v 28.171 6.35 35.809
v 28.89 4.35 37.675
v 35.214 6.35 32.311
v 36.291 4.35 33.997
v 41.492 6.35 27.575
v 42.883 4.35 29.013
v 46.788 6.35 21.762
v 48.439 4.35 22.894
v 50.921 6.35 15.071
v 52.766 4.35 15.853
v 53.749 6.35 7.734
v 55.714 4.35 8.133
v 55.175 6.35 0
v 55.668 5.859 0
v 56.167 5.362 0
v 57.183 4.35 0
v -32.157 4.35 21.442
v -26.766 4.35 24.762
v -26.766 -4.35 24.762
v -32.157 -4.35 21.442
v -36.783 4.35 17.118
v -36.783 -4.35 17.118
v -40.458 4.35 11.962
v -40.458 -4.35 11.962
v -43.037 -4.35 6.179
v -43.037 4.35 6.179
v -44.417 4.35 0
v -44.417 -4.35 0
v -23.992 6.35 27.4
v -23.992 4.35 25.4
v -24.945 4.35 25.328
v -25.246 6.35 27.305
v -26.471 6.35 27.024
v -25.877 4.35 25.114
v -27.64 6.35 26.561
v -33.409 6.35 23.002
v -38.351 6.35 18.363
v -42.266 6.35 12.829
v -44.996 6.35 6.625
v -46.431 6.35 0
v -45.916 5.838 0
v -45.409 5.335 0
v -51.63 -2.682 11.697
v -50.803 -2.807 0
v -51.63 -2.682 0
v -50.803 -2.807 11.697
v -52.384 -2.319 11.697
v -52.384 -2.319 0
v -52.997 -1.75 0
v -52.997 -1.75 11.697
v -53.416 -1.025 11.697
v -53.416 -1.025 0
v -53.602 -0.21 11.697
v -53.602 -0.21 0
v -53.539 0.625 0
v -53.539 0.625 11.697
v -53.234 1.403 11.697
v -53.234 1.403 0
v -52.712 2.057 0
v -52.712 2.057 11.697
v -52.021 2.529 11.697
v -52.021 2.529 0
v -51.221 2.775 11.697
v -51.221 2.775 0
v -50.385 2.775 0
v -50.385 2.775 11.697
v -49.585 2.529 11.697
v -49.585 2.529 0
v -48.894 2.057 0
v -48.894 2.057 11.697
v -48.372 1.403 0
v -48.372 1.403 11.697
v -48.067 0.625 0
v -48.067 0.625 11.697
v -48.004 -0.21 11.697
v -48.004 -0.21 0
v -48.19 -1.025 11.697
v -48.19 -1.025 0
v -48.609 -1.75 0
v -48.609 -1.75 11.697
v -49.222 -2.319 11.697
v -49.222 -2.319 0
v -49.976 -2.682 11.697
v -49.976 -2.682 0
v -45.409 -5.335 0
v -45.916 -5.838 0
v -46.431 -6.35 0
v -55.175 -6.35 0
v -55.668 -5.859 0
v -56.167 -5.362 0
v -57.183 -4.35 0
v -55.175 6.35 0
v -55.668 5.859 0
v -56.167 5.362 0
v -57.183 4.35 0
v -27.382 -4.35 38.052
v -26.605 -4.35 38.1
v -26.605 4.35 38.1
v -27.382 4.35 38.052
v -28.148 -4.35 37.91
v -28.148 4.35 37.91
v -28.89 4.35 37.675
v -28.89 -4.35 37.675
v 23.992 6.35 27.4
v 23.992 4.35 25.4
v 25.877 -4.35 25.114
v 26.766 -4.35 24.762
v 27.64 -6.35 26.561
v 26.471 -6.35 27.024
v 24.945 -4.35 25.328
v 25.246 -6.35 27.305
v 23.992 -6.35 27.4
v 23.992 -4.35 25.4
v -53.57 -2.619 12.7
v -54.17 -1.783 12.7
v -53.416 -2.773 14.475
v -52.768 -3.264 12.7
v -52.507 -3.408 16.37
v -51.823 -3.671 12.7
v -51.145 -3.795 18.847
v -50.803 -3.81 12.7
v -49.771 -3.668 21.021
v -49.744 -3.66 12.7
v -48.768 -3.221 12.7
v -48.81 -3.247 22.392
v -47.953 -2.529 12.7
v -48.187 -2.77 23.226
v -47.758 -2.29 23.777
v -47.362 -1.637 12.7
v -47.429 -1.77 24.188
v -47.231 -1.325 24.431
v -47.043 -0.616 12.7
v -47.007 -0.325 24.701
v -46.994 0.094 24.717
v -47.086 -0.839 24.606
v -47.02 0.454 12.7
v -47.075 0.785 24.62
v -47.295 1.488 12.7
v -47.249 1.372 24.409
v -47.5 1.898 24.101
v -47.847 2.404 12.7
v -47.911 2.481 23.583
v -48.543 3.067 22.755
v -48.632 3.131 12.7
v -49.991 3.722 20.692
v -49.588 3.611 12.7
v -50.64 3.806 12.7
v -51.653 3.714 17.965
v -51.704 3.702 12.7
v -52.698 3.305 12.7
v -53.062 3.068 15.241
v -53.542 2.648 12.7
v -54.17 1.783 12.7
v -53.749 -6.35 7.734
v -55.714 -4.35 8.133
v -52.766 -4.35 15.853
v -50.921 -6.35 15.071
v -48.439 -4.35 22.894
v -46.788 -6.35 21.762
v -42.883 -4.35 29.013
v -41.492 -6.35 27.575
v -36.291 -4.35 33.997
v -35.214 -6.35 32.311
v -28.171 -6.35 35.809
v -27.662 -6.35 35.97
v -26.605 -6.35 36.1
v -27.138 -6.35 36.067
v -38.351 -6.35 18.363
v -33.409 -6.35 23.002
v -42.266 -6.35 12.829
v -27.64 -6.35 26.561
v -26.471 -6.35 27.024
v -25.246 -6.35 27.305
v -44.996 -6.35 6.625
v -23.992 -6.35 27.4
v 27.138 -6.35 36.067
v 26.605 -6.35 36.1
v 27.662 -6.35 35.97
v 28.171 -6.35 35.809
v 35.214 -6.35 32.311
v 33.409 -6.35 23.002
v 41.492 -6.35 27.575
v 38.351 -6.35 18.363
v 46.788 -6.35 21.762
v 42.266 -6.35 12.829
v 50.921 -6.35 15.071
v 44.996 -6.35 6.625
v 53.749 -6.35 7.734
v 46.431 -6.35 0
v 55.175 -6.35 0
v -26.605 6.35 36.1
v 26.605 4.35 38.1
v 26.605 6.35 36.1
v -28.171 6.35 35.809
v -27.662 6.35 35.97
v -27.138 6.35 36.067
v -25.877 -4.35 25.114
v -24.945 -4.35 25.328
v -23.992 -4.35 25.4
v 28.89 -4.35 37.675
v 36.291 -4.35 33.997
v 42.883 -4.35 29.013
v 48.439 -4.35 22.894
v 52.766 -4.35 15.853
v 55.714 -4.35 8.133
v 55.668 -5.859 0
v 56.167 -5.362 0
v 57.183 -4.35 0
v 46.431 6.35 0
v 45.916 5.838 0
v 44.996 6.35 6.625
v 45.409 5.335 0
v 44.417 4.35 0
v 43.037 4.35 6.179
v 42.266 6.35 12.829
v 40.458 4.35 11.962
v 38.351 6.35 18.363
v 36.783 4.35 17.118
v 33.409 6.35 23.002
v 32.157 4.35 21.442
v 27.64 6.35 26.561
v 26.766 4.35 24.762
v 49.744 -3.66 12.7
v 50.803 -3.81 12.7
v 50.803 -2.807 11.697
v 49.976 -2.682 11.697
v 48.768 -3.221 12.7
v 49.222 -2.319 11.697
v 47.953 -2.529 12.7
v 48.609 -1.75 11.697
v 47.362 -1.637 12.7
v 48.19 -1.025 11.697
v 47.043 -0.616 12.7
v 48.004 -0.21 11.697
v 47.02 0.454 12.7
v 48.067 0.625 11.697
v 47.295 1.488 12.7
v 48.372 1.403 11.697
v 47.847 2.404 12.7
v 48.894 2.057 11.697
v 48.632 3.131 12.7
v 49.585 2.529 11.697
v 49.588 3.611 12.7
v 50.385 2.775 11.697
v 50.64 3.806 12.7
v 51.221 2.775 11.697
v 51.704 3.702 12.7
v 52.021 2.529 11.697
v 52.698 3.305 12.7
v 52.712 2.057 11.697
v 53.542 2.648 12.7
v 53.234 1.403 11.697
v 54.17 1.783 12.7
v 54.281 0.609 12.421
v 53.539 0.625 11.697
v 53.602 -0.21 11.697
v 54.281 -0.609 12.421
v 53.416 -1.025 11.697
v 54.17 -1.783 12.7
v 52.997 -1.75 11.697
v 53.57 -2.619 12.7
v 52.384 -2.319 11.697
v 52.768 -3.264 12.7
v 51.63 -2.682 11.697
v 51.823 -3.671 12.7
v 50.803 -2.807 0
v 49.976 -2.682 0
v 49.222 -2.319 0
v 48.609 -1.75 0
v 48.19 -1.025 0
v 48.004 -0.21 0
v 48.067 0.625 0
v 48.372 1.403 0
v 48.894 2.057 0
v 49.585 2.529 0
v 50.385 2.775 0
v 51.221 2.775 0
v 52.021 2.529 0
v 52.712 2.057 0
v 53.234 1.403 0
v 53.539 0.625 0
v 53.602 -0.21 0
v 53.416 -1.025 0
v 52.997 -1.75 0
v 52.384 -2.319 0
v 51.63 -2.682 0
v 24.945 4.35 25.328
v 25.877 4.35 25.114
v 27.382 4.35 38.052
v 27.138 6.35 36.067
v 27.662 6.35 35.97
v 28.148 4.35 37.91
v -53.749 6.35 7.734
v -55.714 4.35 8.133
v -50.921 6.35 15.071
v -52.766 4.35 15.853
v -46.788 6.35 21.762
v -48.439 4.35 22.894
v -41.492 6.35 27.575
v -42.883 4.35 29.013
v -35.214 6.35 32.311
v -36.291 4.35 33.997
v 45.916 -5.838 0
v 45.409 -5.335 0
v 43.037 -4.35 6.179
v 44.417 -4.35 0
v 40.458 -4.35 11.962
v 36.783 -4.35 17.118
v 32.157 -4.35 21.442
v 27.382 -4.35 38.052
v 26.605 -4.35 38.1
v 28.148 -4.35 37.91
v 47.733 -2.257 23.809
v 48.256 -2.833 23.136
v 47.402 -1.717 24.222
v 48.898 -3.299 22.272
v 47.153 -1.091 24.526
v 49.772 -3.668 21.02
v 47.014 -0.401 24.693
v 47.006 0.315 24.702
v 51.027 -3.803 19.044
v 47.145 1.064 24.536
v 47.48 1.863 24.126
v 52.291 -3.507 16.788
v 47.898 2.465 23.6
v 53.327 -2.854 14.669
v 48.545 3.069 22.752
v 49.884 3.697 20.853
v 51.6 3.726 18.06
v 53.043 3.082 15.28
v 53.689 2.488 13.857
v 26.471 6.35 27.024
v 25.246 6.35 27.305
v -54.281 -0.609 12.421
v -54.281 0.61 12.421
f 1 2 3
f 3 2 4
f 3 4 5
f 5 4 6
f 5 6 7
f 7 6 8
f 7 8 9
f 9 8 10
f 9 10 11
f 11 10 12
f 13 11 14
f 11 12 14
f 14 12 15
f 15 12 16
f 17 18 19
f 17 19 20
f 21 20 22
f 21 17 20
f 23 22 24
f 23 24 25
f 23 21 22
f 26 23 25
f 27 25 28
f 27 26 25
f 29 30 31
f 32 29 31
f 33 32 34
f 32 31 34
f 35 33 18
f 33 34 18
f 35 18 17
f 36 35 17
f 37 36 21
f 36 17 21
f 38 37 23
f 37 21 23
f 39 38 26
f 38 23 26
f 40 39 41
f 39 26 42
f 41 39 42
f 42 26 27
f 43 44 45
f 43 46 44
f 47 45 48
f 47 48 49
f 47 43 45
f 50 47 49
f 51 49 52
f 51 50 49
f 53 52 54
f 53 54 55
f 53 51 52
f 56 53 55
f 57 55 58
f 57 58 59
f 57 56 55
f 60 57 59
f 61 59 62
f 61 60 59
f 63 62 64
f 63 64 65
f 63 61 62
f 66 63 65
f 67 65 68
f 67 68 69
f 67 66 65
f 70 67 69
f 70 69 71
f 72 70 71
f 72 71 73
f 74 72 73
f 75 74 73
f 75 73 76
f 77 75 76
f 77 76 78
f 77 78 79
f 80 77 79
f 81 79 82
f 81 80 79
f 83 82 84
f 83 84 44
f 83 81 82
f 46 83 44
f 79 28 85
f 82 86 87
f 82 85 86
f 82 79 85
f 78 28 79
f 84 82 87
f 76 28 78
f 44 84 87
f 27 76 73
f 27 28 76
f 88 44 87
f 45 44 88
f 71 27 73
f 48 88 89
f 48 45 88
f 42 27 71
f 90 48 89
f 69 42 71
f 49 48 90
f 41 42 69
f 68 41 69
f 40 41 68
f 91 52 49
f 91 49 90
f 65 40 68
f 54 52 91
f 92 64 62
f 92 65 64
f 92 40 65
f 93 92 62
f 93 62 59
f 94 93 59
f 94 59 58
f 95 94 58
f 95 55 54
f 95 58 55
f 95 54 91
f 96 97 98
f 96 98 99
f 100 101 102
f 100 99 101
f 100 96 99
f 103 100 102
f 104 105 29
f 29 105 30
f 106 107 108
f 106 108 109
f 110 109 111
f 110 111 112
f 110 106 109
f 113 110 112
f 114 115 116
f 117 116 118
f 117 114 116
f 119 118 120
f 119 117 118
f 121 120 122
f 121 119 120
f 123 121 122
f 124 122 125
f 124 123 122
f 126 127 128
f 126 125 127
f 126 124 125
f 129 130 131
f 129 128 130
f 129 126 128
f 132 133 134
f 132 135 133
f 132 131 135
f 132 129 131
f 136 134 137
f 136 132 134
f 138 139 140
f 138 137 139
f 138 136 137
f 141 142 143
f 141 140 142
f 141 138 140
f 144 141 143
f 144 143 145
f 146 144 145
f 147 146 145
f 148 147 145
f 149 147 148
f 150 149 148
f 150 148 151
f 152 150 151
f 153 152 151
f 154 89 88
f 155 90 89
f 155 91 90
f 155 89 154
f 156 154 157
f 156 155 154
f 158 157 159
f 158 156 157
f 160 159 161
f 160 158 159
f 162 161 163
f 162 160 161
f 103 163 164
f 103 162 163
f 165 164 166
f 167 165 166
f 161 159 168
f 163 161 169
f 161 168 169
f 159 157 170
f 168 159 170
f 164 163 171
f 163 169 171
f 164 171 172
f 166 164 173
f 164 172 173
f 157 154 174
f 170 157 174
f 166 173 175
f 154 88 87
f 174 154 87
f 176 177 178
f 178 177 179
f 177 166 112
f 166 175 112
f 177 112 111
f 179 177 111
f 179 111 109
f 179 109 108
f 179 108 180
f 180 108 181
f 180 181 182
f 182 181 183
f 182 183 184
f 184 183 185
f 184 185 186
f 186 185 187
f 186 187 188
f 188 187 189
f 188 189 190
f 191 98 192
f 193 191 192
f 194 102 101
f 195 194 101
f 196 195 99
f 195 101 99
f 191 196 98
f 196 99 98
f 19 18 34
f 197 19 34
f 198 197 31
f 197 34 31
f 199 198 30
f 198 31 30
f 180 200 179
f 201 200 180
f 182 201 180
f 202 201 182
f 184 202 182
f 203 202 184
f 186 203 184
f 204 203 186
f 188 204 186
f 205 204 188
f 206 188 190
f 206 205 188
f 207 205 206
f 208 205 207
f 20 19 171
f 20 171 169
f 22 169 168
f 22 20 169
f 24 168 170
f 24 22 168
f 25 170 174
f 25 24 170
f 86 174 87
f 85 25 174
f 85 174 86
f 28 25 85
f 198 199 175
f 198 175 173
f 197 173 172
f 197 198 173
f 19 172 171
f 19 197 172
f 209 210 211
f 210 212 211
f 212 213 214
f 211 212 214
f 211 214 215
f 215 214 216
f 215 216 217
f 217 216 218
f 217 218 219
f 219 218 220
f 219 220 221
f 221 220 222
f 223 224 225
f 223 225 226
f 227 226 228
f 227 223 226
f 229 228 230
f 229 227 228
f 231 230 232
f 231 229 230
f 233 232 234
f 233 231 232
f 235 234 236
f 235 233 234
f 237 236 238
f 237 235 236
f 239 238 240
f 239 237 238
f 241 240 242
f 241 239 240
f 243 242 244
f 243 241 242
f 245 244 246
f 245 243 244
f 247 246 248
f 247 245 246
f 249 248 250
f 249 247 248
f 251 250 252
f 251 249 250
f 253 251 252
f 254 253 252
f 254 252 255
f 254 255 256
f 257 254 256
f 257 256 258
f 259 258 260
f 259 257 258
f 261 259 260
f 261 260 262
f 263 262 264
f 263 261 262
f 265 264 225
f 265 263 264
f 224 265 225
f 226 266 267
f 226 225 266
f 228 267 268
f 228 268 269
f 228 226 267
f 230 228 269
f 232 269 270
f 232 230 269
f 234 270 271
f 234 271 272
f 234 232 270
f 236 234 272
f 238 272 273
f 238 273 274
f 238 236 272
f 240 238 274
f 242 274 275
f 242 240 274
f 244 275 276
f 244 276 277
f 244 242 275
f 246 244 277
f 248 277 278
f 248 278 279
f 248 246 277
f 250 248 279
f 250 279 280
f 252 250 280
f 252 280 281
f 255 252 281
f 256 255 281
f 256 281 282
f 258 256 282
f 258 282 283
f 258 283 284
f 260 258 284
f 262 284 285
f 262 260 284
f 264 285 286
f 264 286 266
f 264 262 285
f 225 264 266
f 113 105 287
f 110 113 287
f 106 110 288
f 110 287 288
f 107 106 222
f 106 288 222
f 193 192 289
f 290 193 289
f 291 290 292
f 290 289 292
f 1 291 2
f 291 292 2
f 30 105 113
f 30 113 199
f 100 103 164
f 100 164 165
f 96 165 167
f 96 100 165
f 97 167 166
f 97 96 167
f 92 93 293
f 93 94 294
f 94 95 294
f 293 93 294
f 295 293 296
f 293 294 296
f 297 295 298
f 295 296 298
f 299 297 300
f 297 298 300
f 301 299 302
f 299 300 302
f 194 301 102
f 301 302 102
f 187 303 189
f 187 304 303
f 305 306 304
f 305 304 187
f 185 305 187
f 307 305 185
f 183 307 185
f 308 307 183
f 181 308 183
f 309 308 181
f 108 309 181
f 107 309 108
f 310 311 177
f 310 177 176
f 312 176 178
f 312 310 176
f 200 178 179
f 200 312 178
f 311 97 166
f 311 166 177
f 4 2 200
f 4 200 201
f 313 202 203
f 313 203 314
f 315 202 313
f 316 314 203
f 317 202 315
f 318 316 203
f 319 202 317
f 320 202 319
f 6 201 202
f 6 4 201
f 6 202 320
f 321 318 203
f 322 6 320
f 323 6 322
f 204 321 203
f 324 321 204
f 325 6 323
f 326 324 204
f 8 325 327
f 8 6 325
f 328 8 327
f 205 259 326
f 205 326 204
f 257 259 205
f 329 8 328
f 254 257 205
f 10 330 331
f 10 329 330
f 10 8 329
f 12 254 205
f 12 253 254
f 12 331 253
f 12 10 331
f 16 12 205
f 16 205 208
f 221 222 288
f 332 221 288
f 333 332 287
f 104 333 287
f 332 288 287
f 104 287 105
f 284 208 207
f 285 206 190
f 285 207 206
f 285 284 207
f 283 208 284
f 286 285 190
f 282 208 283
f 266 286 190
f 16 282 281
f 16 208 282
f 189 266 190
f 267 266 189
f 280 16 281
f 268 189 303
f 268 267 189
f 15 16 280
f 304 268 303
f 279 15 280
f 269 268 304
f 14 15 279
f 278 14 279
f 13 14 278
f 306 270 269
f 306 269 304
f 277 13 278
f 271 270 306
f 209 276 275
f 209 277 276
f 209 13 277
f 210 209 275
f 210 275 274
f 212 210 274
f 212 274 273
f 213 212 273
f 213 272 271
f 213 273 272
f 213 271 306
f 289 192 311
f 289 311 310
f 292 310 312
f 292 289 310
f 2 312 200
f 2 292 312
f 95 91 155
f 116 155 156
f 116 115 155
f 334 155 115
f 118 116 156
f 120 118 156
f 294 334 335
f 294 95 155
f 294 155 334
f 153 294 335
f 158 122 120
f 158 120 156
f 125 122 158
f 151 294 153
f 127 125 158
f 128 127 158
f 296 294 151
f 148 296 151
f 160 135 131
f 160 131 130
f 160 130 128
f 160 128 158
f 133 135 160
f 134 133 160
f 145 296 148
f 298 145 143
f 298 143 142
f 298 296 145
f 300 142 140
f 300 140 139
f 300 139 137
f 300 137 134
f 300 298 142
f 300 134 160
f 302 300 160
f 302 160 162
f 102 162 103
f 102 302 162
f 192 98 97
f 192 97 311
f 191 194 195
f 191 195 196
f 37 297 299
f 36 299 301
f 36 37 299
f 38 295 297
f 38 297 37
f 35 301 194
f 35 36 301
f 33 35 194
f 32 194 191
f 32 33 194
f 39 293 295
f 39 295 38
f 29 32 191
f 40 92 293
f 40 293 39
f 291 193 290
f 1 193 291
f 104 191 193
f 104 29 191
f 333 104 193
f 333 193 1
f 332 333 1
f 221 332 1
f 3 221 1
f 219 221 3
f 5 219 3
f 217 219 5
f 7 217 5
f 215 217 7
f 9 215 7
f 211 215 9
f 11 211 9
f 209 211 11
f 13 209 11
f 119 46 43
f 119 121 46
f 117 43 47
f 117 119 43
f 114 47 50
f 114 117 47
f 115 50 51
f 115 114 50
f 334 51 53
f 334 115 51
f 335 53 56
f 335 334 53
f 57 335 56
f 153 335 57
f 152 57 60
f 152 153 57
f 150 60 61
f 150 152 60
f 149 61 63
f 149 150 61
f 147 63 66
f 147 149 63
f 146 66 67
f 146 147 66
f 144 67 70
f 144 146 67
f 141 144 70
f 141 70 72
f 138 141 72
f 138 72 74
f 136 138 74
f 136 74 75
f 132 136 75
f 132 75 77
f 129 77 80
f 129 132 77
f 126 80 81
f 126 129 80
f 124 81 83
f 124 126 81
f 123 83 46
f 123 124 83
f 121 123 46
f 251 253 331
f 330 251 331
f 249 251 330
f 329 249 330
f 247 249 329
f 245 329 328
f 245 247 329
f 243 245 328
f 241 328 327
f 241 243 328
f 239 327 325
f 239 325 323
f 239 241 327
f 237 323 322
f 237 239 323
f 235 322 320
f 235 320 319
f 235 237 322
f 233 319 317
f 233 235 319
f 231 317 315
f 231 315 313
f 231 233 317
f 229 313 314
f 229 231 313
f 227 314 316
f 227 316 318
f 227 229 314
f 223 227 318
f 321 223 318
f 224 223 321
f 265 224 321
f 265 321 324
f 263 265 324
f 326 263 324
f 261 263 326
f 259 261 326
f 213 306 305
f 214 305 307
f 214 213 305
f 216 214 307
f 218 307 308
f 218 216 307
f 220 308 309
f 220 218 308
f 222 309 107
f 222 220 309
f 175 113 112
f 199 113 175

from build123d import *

# Parameters (mm, degrees)
BOSS_EXTRUDE1_DEPTH             = 6.35
FILLET1_R                       = 6.35
CHAMFER1_SIZE                   = 2
SKETCH3_R                       = 2.54
CUT_EXTRUDE1_DEPTH              = 63.891530963
F_10_CLEARANCE_HOLE1_AT_2_COUNT = 2
F_10_CLEARANCE_HOLE1_AT_2_PITCH = 101.605909567
SKETCH6_R                       = 3.81
CUT_EXTRUDE2_DEPTH              = 63.891531054


with BuildPart() as part:
    # Sketch2 → Boss-Extrude1 (new, symmetric)
    with BuildSketch(Plane(origin=(0, 0, 0), x_dir=(1, 0, 0), z_dir=(0, 1, 0))):
        with BuildLine():
            Line((-27.740386752, -38.1), (27.740386752, -38.1))
            ThreePointArc((27.740386752, -38.1), (48.067233392, -23.381874086), (57.182708636, 0))
            Line((57.182708636, 0), (44.417291364, 0))
            ThreePointArc((44.417291364, 0), (38.295246108, -15.252216058), (25.367291364, -25.4))
            Line((25.367291364, -25.4), (-25.367291364, -25.4))
            ThreePointArc((-25.367291364, -25.4), (-38.295246108, -15.252216058), (-44.417291364, 0))
            Line((-44.417291364, 0), (-57.182708636, 0))
            ThreePointArc((-57.182708636, 0), (-48.067233392, -23.381874086), (-27.740386752, -38.1))
        make_face()
    extrude(amount=BOSS_EXTRUDE1_DEPTH, both=True)

    # Fillet1
    fillet1_edges = [part.edges().sort_by_distance(p)[0] for p in [
        (-25.367291364, 0, 25.4),
        (25.367291364, 0, 25.4),
        (27.740386752, 0, 38.1),
        (-27.740386752, 0, 38.1),
    ]]
    fillet(fillet1_edges, radius=FILLET1_R)

    # Chamfer1
    chamfer1_edges = [part.edges().sort_by_distance(p)[0] for p in [
        (-48.438733528, -6.35, 22.894218644),
        (38.749073181, 6.35, 14.631598188),
        (-38.749073181, -6.35, 14.631598188),
        (-38.749073181, 6.35, 14.631598188),
        (0, -6.35, 25.4),
        (0, 6.35, 25.4),
        (48.438733528, -6.35, 22.894218644),
        (48.438733528, 6.35, 22.894218644),
        (0, -6.35, 38.1),
        (-27.76741166, -6.35, 37.992751984),
        (27.76741166, -6.35, 37.992751984),
        (0, 6.35, 38.1),
        (-27.76741166, 6.35, 37.992751984),
        (27.76741166, 6.35, 37.992751984),
        (-25.4153506, -6.35, 25.238431021),
        (-25.4153506, 6.35, 25.238431021),
        (25.4153506, -6.35, 25.238431021),
        (25.4153506, 6.35, 25.238431021),
        (-48.438733528, 6.35, 22.894218644),
        (38.749073181, -6.35, 14.631598188),
    ]]
    chamfer(chamfer1_edges, length=CHAMFER1_SIZE)

    # Sketch3 → Cut-Extrude1 (cut, through all)
    with BuildSketch(Plane.XY.offset(12.7)):
        with Locations(Location((50.802954783, 0, 0), (0, 0, 180))):
            Circle(SKETCH3_R)
        with Locations(Location((-50.802954783, 0, 0), (0, 0, 180))):
            Circle(SKETCH3_R)
    extrude(amount=CUT_EXTRUDE1_DEPTH, mode=Mode.SUBTRACT)

    # Sketch5 → #10 Clearance Hole1 (revolve, cut)
    with BuildSketch(Plane(origin=(50.802954783, 0, 12.7), x_dir=(0, -1, 0), z_dir=(1, 0, 0))):
        Polygon((0, 0), (0, 12.7), (2.8067, 12.7), (2.8067, 1.0033), (3.81, 0), align=None)
    f_10_clearance_hole1 = revolve(axis=Axis((50.802954783, 0, 19.05), (0, 0, -1)), mode=Mode.SUBTRACT)

    # #10 Clearance Hole1 at 2: #10 Clearance Hole1 ×2
    with Locations(*[(-i * F_10_CLEARANCE_HOLE1_AT_2_PITCH, 0, 0) for i in range(1, F_10_CLEARANCE_HOLE1_AT_2_COUNT)]):
        add(f_10_clearance_hole1, mode=Mode.SUBTRACT)

    # Sketch6 → Cut-Extrude2 (cut, through all)
    with BuildSketch(Plane.XY.offset(12.7)):
        with Locations((50.802954783, 0)):
            Circle(SKETCH6_R)
        with Locations((-50.802954783, 0)):
            Circle(SKETCH6_R)
    extrude(amount=CUT_EXTRUDE2_DEPTH, mode=Mode.SUBTRACT)


solid = part.part
